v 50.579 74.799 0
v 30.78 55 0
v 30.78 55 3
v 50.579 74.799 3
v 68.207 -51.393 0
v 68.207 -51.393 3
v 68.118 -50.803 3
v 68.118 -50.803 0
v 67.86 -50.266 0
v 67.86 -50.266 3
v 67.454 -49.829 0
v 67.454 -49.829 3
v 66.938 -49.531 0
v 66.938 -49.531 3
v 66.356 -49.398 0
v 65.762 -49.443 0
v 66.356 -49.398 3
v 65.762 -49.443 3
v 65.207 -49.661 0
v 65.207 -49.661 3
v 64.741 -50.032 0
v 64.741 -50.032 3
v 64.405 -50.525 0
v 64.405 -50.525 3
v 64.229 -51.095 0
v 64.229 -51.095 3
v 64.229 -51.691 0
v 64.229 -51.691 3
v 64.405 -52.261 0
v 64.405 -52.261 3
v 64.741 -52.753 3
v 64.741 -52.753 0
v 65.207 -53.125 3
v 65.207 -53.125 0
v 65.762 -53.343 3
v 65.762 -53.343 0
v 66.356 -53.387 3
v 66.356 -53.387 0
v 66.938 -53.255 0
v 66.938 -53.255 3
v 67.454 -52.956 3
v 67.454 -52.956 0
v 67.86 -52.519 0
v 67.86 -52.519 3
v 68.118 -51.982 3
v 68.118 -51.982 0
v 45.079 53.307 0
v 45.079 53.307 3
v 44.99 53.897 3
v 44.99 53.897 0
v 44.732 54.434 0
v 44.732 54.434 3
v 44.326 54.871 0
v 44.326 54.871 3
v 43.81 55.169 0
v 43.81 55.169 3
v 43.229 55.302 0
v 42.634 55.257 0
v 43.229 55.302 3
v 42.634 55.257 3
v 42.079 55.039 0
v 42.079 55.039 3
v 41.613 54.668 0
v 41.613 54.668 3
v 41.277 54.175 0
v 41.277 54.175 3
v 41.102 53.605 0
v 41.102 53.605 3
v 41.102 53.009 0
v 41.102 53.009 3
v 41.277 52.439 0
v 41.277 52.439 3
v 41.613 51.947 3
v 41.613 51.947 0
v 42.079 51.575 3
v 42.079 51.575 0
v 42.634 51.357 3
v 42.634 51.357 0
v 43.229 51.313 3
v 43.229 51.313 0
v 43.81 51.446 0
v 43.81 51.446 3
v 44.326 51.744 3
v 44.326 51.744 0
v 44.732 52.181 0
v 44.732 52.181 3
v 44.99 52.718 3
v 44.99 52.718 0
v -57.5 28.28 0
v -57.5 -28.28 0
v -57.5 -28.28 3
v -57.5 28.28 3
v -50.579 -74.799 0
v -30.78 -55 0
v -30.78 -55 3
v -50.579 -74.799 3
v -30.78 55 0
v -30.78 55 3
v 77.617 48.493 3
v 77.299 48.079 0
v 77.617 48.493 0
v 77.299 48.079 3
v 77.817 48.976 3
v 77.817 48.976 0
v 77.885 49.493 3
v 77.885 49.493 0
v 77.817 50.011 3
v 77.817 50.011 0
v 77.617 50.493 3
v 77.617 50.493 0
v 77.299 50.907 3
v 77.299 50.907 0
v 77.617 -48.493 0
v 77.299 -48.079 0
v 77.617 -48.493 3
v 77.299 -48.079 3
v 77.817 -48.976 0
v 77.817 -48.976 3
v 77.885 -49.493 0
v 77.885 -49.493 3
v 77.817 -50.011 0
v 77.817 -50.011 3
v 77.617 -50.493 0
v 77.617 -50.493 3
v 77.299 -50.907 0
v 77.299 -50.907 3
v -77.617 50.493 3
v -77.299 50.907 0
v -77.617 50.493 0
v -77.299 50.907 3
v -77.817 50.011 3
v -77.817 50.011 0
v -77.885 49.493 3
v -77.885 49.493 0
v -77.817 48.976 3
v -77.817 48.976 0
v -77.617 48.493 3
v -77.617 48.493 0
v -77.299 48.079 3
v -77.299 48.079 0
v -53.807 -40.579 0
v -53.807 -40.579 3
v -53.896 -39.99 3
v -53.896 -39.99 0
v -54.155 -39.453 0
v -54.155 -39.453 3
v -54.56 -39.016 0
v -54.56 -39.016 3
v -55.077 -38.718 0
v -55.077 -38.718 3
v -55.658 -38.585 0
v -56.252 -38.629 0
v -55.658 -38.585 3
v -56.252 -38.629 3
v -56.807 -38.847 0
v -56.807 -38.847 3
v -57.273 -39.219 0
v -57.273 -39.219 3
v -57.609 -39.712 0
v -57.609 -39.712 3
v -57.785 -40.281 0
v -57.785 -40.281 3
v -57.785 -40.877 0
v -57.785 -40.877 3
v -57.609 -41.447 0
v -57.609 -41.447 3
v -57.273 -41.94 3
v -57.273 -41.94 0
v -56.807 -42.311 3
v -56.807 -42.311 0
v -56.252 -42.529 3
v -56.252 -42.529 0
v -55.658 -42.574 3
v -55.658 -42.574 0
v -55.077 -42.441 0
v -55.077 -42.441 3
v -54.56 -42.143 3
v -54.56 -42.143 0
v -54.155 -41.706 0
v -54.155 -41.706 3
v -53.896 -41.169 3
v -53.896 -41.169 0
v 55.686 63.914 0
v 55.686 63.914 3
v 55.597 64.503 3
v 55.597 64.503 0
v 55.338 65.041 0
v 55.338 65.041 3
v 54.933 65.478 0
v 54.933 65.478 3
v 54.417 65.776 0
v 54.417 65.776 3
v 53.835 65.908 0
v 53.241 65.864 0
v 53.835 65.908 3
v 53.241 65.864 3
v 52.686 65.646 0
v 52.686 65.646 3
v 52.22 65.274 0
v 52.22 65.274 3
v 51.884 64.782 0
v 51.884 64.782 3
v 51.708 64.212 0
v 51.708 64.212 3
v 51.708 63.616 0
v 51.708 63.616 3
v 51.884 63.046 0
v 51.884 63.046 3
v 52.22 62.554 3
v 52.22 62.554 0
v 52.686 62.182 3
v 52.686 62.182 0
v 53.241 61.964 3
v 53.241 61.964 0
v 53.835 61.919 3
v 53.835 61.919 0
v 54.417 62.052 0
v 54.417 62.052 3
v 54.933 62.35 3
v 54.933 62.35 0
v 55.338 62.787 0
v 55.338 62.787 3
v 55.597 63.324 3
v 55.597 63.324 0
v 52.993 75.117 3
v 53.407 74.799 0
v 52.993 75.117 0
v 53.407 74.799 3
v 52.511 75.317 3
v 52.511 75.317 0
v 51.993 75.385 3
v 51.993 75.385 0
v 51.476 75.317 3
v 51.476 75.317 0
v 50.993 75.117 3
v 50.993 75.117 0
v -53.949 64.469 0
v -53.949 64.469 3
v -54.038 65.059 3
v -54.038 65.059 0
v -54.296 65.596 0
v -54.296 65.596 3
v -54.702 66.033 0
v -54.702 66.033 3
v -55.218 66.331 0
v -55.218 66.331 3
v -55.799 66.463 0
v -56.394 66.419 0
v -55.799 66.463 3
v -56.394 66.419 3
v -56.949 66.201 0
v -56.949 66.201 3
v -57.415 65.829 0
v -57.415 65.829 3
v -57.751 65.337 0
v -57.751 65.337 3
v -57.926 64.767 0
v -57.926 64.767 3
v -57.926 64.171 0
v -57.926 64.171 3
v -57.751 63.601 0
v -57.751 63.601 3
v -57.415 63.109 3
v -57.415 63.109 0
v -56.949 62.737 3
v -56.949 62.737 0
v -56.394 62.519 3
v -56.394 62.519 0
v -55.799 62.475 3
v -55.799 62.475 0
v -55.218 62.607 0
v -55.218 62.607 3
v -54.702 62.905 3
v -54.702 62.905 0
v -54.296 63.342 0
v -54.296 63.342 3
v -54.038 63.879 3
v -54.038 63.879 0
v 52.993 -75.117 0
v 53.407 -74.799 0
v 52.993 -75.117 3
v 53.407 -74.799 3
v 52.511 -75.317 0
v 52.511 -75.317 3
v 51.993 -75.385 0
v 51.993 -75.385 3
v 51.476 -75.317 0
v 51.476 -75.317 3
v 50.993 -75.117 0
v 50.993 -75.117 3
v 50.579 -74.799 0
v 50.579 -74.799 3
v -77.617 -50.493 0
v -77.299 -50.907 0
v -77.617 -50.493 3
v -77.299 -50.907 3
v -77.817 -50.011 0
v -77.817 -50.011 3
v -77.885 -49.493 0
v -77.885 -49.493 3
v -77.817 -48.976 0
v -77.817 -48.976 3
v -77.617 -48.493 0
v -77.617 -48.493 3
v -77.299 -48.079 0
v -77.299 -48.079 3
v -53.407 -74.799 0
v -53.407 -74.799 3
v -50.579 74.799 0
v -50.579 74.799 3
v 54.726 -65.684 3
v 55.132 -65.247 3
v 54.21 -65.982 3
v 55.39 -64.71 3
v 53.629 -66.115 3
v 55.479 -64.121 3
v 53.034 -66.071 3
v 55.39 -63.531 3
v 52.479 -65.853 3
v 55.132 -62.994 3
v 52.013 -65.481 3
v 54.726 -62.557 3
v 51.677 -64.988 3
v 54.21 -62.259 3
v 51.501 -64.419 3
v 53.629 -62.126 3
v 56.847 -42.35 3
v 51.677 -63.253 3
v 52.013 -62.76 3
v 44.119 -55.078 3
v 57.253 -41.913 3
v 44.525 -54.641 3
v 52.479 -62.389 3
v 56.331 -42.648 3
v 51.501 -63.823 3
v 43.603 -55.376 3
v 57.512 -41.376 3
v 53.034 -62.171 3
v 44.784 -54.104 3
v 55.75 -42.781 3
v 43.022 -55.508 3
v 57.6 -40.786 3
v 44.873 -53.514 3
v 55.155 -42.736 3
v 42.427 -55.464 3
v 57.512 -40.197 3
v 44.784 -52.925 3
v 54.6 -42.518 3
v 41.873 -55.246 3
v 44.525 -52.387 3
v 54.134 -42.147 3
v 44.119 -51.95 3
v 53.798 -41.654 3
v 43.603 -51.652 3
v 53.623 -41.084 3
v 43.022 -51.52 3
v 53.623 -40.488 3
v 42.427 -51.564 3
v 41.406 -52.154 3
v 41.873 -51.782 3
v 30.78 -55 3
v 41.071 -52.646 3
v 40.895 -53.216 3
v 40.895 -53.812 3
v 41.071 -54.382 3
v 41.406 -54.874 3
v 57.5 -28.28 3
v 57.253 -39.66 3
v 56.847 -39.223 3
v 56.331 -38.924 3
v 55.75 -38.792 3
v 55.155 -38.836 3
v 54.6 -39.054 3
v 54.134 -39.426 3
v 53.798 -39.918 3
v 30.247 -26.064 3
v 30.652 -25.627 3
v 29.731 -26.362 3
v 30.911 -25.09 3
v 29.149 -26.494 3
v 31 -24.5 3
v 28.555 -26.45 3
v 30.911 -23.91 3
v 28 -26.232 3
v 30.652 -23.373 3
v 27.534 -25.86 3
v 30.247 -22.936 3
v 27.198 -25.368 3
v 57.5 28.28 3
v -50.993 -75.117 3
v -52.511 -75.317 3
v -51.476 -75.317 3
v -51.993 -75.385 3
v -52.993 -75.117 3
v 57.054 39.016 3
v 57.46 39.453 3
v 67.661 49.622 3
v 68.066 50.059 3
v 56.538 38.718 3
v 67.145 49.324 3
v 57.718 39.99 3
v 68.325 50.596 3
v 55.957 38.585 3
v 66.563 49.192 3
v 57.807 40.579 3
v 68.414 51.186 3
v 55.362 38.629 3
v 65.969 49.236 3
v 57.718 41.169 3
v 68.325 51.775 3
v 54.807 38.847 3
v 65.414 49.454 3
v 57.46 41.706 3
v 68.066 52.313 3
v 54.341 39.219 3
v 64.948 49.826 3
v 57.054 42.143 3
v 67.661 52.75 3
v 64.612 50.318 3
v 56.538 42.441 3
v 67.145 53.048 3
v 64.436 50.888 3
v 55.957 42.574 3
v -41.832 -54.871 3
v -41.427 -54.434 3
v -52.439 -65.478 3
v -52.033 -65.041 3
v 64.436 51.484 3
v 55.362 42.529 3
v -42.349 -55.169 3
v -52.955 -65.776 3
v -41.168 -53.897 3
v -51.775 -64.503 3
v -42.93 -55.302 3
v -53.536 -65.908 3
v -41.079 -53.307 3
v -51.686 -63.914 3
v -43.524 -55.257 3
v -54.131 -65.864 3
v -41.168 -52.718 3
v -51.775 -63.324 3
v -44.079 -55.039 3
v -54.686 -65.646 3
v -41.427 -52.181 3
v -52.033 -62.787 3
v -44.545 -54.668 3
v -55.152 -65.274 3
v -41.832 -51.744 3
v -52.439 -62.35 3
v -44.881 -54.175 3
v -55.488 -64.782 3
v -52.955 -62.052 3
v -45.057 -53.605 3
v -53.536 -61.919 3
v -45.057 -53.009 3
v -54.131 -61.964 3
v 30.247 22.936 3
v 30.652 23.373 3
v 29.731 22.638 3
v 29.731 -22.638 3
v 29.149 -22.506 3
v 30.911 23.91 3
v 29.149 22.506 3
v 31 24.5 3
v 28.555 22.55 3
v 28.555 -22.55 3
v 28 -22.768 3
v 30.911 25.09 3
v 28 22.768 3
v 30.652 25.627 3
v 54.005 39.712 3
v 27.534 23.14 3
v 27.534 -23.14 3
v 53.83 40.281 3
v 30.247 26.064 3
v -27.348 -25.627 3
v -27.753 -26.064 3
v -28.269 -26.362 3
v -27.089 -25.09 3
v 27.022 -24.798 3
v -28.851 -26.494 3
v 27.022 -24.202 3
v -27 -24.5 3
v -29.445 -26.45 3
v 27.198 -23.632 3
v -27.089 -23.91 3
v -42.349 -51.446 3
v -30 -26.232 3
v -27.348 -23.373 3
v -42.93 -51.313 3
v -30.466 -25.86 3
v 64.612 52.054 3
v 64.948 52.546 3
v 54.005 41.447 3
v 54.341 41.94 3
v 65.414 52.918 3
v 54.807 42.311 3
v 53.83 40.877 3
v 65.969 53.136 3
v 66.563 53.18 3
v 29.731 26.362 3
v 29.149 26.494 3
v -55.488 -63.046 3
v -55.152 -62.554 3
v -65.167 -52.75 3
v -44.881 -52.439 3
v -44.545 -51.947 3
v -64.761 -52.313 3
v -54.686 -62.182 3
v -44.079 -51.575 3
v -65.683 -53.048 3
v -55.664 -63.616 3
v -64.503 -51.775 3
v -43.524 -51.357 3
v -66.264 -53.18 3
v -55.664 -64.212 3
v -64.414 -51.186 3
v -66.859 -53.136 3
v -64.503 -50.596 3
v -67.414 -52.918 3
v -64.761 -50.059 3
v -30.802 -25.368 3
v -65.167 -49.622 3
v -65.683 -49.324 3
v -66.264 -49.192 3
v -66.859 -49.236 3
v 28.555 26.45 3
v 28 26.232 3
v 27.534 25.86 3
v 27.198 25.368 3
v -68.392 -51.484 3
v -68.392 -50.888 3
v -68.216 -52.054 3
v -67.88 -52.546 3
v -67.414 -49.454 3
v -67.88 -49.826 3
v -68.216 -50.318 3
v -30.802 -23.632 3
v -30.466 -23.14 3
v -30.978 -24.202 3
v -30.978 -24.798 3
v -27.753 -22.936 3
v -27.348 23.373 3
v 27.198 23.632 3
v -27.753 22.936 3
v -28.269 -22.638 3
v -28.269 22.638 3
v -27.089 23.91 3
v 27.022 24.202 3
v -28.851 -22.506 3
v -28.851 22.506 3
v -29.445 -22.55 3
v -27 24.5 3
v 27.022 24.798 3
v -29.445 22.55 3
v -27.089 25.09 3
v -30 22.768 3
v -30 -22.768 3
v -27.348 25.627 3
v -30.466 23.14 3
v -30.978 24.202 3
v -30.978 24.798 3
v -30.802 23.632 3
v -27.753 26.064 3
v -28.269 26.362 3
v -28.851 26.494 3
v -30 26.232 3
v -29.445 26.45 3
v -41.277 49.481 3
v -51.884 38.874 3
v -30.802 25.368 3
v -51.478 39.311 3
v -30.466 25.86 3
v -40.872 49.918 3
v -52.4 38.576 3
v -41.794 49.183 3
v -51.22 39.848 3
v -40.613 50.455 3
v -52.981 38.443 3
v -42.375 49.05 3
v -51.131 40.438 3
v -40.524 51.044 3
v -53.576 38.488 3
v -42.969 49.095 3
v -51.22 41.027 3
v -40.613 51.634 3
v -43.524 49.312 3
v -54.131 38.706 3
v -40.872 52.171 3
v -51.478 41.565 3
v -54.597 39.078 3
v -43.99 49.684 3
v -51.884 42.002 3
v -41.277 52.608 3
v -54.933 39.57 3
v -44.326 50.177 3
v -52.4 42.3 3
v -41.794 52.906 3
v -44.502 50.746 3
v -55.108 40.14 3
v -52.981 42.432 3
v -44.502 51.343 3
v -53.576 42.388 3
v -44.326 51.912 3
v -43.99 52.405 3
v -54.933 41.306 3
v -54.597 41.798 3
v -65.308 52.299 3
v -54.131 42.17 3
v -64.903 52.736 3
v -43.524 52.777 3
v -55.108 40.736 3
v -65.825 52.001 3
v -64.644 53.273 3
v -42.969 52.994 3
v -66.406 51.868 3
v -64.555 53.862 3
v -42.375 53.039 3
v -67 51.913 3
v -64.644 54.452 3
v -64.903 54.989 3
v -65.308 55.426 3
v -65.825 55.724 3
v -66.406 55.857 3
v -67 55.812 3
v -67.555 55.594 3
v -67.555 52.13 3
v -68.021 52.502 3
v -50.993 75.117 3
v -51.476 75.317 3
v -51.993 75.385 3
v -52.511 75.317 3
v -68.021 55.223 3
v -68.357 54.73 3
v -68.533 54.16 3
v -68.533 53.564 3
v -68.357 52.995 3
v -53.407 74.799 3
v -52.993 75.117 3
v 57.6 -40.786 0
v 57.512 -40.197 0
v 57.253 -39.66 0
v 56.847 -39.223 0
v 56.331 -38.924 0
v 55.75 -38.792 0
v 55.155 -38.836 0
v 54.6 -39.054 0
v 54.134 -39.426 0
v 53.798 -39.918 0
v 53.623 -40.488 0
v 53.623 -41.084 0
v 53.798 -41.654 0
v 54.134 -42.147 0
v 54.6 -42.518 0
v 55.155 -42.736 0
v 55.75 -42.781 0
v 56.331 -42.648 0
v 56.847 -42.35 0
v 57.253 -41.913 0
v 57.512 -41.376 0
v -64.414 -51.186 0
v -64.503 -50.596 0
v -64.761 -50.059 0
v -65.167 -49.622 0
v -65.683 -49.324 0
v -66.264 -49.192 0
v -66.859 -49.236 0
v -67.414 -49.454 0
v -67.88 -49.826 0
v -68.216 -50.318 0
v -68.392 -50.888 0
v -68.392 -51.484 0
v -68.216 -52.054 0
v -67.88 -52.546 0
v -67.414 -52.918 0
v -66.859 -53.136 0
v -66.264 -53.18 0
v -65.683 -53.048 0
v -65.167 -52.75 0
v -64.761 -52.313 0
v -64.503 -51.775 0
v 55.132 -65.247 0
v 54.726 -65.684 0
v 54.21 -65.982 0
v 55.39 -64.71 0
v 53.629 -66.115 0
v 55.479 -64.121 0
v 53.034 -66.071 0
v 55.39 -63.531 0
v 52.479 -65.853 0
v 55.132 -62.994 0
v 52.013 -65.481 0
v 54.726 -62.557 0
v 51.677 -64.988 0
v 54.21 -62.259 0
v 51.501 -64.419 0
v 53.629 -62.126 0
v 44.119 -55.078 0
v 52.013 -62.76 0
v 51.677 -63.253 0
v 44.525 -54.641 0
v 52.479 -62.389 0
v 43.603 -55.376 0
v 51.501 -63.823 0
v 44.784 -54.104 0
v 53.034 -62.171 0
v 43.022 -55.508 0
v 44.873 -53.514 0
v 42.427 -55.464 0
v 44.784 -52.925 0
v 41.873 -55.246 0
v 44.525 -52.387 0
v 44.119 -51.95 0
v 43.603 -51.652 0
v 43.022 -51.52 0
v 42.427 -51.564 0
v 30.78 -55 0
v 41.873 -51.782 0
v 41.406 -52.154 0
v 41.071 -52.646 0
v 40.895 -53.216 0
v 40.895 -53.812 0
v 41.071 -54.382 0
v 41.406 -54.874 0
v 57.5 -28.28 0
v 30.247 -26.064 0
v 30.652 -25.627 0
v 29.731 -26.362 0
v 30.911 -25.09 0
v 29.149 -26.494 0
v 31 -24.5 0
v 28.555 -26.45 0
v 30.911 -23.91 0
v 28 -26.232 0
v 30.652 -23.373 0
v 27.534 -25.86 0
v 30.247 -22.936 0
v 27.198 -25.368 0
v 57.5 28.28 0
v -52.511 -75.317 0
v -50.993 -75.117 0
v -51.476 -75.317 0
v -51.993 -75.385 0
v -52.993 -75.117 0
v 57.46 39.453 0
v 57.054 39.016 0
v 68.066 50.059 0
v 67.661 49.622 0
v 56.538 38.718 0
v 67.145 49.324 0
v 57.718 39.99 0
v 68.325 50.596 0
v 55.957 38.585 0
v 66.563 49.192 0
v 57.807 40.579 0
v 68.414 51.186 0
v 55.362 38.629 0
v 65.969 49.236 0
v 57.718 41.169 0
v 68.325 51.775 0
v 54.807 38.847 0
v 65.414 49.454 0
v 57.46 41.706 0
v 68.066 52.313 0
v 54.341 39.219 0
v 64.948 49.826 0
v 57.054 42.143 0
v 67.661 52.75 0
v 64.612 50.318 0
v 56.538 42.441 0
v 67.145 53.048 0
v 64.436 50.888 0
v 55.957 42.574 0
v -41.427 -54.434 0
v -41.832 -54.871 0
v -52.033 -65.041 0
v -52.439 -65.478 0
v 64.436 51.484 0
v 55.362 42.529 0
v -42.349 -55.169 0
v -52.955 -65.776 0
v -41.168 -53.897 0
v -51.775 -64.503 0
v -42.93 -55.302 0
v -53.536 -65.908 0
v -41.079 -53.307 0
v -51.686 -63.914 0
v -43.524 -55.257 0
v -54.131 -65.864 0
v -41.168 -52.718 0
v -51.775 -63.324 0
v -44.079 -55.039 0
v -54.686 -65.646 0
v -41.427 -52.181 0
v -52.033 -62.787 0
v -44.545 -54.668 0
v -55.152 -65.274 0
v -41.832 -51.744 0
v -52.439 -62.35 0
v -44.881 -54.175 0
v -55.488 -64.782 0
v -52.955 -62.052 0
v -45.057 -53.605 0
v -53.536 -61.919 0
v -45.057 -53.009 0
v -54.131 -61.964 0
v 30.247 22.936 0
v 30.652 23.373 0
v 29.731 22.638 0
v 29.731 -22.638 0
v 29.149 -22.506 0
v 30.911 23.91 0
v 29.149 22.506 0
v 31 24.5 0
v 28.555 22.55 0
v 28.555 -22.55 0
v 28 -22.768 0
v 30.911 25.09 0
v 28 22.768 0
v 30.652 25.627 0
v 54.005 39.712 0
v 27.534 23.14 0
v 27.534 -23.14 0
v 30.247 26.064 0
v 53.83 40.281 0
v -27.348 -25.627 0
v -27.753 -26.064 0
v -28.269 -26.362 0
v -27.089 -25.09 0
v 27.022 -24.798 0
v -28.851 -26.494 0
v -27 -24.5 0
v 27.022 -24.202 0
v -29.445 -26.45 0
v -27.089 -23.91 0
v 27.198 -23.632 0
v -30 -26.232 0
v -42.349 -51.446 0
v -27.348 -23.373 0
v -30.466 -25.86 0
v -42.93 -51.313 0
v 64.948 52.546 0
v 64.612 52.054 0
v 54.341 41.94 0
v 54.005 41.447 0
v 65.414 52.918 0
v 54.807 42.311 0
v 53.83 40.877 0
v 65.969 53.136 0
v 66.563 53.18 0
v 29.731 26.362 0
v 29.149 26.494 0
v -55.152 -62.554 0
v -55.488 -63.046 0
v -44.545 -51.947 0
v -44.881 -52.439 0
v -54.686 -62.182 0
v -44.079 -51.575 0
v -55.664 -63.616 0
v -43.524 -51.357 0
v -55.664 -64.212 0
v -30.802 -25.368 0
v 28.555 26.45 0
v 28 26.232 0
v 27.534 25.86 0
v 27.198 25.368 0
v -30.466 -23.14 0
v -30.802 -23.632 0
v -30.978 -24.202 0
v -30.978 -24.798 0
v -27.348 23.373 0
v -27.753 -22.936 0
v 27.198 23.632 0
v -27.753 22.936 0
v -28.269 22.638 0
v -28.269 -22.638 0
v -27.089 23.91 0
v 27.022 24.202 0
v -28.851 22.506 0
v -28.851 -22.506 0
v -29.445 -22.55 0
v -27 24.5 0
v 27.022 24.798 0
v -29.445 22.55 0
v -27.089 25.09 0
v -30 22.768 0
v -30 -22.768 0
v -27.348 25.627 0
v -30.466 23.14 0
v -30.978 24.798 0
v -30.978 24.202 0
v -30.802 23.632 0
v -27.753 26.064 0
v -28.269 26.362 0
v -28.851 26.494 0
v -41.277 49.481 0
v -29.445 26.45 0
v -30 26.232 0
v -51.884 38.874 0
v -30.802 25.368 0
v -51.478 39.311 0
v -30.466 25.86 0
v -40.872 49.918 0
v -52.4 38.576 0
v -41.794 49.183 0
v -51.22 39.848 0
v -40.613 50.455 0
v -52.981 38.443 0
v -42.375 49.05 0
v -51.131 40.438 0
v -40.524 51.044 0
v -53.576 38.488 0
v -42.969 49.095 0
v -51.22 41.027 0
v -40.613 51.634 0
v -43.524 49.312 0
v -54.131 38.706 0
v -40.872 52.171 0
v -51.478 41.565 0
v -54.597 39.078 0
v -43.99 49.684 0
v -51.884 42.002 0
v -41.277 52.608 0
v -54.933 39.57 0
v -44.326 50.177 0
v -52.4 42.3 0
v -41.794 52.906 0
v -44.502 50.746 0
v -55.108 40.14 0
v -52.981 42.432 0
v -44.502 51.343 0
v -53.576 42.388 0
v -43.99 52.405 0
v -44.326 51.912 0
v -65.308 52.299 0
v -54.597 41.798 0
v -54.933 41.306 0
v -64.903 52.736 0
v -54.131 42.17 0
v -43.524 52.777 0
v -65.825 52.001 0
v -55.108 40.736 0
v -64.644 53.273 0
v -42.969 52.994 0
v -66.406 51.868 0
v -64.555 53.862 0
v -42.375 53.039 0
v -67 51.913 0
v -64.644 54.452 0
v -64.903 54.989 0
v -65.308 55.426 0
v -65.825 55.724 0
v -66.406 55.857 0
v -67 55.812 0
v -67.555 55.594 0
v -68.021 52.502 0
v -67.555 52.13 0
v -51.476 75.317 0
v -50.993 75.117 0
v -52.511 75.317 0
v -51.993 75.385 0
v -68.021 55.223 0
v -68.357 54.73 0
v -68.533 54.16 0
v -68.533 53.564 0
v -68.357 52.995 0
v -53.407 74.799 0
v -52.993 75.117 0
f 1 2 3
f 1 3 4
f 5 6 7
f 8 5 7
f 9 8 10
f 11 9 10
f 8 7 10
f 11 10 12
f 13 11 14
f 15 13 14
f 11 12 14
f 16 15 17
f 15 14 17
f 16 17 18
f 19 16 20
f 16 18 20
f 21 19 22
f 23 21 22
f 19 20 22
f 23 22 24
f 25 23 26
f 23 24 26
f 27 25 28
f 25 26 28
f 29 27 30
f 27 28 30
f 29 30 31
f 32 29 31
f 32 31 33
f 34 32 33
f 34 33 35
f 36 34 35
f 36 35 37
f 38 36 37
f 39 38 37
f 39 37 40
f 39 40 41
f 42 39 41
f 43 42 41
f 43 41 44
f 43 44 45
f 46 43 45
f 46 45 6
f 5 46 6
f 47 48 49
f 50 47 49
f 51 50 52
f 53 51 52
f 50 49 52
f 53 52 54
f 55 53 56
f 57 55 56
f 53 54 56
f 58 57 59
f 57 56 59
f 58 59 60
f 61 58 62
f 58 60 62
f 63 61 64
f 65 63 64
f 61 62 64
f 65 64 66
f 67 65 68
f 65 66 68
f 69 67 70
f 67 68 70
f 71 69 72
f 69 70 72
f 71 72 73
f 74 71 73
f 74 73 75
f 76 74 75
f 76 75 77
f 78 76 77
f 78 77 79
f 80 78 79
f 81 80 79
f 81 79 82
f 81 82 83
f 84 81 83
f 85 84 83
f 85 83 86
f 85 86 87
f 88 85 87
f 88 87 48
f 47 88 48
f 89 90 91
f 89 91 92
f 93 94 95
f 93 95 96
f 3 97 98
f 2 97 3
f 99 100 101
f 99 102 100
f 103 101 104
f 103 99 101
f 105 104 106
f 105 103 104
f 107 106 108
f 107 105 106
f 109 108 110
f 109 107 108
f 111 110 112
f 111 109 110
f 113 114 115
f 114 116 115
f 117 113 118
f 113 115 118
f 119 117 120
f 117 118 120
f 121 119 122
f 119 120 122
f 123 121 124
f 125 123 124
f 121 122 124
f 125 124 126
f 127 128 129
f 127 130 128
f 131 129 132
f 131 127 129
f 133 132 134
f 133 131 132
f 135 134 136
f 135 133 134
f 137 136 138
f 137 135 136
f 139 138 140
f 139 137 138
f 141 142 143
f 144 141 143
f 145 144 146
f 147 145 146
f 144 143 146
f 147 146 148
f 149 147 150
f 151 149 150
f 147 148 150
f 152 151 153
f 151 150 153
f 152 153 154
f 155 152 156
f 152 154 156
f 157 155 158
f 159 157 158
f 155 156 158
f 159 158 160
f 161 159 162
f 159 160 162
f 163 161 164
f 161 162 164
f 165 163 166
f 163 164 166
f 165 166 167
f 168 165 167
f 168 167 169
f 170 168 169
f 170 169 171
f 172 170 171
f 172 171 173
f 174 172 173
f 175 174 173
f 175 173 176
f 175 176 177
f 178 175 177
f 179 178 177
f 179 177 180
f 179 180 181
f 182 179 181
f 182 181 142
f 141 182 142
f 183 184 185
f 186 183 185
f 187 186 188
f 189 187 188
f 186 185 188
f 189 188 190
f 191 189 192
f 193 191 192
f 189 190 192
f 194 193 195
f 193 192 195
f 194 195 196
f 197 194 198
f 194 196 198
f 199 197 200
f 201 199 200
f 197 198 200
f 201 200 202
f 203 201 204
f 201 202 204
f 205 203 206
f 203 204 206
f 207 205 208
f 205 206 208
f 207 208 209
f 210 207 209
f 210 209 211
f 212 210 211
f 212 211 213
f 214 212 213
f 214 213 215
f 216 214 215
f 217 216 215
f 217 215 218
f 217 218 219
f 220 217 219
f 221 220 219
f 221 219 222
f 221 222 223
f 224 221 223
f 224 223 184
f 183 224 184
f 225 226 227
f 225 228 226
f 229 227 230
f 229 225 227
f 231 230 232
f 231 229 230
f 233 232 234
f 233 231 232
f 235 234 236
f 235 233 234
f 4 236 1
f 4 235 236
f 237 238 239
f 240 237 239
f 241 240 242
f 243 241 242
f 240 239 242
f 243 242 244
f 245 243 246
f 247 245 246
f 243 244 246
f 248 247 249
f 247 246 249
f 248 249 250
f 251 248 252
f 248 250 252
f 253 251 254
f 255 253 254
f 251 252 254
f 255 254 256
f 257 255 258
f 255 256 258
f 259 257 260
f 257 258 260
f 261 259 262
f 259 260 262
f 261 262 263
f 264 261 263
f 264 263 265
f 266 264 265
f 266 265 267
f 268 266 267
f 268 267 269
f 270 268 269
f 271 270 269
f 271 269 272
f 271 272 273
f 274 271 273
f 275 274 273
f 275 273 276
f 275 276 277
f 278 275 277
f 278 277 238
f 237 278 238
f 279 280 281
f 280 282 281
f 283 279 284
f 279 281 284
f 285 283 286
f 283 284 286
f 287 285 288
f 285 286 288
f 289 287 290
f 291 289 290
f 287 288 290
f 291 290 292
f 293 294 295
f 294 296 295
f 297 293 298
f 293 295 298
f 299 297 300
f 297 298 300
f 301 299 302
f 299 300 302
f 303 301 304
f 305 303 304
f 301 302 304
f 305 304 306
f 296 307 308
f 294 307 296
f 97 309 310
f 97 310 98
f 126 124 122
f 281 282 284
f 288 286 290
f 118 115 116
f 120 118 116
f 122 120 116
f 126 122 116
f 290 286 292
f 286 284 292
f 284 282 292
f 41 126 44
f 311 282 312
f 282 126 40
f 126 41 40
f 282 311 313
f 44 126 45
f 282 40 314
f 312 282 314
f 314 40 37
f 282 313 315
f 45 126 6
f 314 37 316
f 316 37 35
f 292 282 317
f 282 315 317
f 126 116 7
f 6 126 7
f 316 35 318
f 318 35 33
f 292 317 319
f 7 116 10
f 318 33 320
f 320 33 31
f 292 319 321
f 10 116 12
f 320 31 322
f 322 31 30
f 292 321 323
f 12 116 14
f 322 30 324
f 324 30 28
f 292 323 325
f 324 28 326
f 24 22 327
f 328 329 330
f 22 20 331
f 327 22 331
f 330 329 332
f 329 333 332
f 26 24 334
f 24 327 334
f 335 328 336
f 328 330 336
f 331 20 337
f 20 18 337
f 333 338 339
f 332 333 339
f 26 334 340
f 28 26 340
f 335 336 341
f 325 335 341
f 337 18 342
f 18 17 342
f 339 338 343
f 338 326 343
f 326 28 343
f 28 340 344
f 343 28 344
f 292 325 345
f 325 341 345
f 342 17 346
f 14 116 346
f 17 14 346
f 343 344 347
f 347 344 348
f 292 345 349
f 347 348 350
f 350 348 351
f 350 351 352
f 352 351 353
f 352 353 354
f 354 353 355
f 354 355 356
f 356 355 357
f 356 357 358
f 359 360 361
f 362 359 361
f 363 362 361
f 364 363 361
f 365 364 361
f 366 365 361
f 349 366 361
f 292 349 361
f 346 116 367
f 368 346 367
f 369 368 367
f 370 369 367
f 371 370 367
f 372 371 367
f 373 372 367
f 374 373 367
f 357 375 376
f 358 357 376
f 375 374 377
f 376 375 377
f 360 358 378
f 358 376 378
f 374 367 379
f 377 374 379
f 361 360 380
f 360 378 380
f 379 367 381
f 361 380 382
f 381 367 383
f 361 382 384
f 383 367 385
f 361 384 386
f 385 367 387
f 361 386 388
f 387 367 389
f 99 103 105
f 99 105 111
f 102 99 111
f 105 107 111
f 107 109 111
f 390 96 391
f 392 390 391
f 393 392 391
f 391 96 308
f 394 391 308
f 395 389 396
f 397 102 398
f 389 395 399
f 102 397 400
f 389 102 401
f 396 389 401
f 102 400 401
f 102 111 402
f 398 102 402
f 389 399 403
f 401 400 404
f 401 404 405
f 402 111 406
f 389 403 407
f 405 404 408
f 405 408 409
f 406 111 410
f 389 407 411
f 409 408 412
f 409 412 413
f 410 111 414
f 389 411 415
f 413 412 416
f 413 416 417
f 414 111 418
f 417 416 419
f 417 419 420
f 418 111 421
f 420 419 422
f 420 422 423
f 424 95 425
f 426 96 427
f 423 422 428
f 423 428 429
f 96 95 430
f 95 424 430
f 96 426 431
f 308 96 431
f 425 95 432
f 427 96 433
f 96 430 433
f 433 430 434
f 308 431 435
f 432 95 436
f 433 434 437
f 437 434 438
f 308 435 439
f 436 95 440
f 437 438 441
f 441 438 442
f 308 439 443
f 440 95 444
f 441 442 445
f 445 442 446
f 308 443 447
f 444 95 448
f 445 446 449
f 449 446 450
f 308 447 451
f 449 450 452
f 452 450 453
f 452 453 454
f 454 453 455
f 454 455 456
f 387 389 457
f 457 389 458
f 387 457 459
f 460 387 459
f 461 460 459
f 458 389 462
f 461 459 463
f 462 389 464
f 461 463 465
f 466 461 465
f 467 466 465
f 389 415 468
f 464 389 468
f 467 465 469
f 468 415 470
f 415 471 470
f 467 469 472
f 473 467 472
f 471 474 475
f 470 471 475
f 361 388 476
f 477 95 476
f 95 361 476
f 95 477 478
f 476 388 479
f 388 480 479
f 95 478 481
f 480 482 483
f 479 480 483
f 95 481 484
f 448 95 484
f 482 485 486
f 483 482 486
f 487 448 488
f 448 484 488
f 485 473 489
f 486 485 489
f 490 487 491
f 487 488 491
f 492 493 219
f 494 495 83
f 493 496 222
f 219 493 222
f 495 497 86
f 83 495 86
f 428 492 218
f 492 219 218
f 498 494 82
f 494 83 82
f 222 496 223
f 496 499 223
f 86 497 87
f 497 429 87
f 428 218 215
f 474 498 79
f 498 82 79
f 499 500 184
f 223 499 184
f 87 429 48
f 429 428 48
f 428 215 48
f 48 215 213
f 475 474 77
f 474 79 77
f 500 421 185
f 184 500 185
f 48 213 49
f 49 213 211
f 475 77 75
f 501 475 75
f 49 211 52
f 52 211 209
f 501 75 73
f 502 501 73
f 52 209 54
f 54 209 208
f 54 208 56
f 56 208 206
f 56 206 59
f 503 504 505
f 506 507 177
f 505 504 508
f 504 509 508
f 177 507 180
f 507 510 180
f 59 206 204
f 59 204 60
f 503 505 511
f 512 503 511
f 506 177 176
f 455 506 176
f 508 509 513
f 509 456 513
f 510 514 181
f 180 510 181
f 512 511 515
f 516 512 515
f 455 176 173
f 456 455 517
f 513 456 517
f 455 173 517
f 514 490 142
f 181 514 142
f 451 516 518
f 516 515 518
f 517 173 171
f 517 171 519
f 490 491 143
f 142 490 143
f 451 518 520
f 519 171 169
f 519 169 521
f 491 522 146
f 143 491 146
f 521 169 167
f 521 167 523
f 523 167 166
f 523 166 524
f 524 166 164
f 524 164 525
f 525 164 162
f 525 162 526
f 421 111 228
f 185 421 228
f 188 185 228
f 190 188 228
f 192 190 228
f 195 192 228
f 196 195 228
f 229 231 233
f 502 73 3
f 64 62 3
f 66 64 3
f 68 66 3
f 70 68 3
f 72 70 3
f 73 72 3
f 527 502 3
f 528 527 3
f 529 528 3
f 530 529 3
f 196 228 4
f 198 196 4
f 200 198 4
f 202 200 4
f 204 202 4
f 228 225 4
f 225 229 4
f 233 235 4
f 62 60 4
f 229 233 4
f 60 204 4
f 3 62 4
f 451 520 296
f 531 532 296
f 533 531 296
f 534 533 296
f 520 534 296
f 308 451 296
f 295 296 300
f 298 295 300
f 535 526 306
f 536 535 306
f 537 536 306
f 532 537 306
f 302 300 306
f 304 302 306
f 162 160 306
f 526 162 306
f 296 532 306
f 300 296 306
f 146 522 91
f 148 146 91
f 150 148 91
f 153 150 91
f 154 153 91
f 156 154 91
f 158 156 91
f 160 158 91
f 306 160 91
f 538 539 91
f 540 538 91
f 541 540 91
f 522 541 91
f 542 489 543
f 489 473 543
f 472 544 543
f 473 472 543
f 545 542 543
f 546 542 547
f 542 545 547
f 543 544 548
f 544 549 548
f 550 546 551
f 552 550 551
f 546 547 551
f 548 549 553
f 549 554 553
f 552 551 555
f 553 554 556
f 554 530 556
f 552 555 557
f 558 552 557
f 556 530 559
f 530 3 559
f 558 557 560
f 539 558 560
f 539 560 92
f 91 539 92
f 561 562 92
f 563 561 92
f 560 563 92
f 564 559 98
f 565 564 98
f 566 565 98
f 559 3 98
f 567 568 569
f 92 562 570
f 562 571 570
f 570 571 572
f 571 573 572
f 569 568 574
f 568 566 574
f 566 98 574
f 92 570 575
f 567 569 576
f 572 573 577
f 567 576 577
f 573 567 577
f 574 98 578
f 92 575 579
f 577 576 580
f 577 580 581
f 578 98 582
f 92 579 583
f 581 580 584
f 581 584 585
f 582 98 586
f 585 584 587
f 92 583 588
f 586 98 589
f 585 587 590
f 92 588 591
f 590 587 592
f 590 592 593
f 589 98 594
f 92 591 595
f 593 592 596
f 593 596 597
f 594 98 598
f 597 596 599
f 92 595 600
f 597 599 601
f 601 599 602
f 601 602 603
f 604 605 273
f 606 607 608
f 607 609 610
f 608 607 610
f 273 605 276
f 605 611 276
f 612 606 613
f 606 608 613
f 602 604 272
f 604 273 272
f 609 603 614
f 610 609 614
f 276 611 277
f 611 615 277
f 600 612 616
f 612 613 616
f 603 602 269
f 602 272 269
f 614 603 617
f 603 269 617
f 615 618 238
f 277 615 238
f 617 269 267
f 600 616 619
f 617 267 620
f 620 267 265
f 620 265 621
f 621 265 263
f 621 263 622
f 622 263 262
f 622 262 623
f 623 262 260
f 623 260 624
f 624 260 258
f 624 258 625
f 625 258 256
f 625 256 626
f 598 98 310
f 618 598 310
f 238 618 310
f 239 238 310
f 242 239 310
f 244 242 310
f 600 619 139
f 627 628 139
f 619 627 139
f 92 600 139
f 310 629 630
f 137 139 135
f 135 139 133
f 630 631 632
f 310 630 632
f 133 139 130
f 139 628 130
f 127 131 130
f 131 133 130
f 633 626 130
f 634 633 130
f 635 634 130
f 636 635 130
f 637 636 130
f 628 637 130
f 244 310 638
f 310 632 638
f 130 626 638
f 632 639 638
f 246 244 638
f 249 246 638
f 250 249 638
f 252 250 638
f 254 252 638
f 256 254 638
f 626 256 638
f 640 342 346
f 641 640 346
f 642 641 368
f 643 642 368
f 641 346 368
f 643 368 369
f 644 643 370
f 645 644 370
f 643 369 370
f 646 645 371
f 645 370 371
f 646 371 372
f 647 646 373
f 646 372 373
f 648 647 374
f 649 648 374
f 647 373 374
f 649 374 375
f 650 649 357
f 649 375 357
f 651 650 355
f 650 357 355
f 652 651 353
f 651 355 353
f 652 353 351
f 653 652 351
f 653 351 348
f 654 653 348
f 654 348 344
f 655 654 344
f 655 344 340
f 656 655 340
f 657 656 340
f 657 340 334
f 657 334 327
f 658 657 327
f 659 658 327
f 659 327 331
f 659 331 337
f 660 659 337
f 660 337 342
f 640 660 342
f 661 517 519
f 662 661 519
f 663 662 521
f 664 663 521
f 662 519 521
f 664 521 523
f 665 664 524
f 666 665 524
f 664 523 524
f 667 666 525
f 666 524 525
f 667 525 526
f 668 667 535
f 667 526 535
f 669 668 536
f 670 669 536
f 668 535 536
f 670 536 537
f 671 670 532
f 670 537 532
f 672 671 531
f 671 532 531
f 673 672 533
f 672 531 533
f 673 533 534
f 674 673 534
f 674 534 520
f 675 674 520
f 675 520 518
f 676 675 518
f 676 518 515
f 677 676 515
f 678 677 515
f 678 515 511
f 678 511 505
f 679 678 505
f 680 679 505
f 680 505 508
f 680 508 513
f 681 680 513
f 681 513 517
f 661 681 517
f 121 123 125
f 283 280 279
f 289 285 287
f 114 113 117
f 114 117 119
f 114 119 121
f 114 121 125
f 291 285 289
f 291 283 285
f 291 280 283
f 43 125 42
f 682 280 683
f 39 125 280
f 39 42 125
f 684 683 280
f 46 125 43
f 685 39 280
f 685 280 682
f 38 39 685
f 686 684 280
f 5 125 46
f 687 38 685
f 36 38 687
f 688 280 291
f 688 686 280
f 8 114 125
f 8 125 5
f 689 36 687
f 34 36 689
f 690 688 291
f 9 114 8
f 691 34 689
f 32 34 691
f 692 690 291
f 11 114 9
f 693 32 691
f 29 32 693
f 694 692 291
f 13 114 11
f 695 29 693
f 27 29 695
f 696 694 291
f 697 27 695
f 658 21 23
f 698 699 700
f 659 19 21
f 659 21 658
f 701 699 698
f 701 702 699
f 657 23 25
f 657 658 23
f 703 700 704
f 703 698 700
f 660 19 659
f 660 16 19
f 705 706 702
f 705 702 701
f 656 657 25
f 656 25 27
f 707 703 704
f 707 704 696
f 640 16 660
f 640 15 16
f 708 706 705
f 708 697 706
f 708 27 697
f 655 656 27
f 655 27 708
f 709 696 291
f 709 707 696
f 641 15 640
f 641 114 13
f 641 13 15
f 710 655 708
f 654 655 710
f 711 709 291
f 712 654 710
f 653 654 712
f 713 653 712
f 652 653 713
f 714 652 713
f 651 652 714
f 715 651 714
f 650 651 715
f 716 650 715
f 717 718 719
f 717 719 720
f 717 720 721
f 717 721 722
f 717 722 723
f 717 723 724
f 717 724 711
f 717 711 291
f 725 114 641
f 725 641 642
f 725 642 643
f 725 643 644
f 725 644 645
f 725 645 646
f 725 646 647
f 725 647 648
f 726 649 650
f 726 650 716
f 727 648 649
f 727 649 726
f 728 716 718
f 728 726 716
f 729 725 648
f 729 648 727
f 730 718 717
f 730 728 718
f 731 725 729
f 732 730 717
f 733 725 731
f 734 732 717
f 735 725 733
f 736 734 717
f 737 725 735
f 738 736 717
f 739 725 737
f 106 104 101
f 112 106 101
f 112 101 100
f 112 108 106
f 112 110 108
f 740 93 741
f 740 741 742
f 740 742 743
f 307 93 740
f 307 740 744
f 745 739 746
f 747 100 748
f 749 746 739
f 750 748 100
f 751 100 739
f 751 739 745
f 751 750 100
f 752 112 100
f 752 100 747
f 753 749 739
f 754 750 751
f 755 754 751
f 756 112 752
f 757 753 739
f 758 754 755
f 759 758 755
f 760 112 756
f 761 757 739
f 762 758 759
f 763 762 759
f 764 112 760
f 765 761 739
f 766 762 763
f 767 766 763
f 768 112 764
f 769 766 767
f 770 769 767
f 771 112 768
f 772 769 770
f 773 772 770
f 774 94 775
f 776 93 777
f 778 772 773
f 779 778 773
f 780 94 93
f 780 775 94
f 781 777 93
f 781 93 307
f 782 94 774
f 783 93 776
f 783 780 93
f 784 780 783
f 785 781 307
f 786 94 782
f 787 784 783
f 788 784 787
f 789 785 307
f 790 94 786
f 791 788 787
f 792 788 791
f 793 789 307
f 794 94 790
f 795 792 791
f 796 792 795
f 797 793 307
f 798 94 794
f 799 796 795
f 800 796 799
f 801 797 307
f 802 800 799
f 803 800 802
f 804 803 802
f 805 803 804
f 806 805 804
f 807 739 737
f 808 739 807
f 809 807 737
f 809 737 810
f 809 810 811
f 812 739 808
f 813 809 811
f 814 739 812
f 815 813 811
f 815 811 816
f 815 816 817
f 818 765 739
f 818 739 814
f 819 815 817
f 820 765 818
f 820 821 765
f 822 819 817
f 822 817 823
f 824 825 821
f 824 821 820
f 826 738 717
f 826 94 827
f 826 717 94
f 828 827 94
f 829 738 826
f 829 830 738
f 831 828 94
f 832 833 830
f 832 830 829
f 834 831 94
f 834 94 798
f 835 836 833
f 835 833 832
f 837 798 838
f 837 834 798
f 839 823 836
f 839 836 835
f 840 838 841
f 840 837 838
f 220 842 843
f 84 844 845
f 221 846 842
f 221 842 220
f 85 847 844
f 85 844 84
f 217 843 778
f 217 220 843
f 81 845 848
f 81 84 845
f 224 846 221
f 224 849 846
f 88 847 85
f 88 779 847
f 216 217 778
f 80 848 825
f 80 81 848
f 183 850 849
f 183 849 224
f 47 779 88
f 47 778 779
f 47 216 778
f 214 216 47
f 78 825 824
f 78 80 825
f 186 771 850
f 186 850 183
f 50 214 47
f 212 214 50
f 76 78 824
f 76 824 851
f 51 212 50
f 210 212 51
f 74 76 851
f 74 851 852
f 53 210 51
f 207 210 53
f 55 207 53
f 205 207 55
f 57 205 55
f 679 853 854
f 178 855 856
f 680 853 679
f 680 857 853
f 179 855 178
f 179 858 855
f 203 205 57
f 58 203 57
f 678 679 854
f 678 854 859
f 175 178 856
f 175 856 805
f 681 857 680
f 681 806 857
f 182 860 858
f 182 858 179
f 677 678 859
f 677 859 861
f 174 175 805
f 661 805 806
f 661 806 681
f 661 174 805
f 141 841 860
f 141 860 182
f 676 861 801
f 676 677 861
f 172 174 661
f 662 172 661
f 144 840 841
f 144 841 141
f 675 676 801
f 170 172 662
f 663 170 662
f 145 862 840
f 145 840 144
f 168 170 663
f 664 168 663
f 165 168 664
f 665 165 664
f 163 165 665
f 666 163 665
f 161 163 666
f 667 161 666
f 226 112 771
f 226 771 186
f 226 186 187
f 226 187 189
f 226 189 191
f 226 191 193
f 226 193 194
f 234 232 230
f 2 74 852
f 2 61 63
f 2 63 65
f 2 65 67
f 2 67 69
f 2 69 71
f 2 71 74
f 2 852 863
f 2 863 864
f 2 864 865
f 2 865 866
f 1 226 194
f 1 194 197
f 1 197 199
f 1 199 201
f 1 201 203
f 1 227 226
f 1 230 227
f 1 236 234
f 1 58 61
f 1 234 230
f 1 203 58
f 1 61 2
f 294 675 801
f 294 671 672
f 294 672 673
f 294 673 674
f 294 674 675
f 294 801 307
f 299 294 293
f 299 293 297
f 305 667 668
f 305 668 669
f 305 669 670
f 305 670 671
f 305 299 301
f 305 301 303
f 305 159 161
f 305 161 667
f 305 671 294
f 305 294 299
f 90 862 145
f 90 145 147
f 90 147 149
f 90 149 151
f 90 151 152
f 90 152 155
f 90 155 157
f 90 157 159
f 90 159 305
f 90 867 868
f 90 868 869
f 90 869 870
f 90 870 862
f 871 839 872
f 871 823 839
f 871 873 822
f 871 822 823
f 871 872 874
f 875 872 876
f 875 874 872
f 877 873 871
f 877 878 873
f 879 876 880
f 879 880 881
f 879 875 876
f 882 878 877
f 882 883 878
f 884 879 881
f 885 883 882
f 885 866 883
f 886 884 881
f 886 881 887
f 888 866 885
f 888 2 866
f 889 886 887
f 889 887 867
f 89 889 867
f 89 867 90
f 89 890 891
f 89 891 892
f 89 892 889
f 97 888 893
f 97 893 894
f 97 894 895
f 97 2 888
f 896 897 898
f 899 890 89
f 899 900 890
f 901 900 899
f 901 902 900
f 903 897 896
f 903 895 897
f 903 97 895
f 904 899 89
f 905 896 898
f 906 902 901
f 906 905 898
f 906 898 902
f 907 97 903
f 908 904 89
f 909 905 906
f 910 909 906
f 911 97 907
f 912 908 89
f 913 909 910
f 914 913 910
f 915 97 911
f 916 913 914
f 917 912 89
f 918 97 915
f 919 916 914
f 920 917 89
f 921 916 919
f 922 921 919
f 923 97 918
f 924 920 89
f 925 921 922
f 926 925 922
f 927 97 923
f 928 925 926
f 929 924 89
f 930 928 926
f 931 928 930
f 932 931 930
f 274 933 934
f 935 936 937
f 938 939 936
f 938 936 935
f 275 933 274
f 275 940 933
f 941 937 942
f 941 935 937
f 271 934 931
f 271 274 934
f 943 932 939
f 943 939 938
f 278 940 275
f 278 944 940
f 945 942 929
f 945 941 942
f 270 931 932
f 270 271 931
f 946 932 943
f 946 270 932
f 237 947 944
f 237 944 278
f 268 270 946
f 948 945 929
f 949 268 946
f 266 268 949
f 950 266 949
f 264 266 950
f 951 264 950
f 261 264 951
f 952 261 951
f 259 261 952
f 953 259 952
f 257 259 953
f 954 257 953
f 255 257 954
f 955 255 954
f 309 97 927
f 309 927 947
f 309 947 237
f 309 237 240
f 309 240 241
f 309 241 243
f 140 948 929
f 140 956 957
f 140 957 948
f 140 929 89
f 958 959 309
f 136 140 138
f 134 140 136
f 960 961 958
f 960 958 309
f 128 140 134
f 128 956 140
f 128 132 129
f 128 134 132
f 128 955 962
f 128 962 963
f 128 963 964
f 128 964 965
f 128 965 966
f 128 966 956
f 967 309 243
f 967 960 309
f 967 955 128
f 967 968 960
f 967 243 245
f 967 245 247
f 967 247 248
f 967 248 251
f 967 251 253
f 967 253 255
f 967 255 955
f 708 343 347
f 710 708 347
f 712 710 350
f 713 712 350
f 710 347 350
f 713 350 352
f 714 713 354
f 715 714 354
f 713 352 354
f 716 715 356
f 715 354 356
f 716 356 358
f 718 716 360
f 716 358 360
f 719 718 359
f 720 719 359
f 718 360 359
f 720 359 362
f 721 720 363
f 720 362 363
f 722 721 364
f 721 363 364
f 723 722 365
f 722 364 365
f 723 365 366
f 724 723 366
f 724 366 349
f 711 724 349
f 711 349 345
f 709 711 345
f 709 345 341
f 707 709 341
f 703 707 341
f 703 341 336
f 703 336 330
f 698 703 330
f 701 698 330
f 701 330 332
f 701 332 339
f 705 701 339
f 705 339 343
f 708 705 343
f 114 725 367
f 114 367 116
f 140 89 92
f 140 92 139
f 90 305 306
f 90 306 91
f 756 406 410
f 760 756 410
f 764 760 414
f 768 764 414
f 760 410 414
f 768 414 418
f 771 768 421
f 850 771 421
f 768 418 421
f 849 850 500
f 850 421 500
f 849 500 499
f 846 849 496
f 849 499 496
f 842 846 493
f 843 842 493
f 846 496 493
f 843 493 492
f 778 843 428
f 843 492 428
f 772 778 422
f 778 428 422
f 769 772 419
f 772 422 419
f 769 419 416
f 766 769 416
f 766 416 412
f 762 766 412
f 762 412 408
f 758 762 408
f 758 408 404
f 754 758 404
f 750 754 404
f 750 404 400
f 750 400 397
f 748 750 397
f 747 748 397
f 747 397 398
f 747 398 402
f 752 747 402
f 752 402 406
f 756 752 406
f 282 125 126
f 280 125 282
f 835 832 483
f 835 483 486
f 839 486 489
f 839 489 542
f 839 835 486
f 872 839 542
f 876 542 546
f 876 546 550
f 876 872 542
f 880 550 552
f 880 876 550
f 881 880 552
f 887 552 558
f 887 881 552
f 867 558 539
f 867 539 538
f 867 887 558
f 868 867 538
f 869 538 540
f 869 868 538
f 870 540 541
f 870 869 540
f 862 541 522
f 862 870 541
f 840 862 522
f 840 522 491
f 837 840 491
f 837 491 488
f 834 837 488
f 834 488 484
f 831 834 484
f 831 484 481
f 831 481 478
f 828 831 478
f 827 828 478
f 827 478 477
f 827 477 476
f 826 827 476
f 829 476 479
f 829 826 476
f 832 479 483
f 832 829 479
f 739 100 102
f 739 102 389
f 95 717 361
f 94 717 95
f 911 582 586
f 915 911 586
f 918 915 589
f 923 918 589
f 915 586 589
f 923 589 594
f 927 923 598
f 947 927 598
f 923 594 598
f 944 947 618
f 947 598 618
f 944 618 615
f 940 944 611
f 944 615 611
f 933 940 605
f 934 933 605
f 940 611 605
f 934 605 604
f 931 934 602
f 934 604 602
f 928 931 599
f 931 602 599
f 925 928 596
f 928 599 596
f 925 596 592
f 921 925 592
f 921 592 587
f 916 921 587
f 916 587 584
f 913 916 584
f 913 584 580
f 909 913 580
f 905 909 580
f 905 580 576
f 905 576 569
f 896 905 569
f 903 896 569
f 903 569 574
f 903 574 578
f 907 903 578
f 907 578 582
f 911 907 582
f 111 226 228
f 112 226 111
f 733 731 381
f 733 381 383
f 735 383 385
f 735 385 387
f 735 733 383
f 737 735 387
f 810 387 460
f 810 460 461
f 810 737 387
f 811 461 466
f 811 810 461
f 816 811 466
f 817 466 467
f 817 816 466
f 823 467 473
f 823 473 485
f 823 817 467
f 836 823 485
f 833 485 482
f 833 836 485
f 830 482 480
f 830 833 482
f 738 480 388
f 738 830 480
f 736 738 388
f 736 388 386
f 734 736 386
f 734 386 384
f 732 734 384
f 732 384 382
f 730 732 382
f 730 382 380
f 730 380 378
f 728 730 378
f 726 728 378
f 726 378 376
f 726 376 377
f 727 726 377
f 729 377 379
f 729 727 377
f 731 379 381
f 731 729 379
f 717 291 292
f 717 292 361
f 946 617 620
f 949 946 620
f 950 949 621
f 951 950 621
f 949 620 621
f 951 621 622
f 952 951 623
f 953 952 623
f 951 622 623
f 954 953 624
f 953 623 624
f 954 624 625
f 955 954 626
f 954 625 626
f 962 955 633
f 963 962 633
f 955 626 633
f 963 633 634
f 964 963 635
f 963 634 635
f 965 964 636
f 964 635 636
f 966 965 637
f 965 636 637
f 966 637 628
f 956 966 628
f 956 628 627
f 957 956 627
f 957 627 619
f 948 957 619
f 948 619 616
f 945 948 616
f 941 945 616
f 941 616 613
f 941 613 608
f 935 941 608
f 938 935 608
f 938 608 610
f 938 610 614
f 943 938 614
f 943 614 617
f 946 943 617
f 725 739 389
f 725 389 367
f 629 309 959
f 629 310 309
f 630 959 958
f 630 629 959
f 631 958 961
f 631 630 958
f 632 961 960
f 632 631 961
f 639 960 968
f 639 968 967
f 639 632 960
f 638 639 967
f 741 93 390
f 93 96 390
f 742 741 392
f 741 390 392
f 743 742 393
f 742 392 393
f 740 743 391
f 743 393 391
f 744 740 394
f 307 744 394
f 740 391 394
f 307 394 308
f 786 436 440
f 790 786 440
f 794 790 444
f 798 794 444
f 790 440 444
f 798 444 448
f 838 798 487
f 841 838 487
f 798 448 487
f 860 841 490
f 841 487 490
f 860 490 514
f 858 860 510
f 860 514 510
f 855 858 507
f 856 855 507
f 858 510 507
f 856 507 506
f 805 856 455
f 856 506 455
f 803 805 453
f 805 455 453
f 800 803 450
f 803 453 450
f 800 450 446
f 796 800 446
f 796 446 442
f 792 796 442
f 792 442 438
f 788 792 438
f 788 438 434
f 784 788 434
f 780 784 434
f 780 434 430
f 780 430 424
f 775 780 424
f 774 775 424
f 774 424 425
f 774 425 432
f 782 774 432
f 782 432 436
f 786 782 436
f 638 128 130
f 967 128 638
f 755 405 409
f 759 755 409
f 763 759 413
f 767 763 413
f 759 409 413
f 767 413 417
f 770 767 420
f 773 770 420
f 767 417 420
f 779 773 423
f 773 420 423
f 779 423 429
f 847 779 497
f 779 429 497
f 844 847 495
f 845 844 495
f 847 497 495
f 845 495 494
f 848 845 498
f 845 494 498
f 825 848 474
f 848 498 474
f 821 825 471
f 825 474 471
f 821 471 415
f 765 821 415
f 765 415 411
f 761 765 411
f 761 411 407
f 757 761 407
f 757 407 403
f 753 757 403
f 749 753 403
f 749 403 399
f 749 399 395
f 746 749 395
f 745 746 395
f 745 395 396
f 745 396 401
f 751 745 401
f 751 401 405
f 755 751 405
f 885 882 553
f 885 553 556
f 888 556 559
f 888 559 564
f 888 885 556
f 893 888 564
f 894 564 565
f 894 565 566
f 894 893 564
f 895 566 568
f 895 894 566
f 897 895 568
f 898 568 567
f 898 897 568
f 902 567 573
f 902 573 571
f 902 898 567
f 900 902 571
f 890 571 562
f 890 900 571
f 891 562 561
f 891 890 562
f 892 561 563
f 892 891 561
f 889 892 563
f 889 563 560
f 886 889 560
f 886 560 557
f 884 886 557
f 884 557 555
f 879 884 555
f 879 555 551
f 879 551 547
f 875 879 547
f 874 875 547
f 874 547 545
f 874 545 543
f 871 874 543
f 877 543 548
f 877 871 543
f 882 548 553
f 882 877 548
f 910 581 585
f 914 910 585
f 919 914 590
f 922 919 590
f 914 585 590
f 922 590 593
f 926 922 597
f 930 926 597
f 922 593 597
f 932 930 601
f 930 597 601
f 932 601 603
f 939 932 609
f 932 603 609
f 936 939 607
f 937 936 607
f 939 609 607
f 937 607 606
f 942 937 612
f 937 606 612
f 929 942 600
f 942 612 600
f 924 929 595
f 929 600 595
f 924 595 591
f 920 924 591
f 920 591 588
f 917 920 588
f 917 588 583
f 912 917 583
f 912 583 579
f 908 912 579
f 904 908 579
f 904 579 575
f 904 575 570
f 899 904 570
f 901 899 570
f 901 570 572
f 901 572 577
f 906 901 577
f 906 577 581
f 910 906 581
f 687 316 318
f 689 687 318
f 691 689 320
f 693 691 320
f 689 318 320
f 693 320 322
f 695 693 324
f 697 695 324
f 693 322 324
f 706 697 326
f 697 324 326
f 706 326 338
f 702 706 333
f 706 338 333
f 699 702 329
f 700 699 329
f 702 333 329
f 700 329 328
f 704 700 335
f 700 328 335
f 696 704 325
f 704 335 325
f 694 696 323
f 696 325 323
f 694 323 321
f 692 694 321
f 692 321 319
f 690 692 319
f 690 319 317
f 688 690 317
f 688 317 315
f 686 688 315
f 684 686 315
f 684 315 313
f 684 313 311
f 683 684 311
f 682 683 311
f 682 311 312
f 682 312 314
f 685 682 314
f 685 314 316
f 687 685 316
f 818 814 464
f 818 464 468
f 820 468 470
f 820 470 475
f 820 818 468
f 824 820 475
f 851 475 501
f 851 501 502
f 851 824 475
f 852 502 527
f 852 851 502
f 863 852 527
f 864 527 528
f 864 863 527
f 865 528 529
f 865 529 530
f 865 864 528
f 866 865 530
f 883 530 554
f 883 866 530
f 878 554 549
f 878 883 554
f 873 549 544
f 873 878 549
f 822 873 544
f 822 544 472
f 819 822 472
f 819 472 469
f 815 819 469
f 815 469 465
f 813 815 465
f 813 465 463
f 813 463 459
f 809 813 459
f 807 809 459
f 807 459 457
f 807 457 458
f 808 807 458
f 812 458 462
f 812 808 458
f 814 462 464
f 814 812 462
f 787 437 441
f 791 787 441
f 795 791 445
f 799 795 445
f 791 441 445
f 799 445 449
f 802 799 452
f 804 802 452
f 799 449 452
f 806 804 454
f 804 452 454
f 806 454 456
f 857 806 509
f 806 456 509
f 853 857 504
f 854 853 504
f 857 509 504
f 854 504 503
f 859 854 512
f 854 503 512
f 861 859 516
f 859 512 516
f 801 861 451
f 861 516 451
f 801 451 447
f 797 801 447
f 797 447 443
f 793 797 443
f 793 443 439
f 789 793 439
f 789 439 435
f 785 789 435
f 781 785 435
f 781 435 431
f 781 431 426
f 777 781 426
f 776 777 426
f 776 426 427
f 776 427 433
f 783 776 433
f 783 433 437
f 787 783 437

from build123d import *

# Parameters (mm, degrees)
SKETCH1_R           = 2
BOSS_EXTRUDE1_DEPTH = 3
SKETCH2_R           = 2
CUT_EXTRUDE1_DEPTH  = 110.604839186
FILLET1_R           = 2


with BuildPart() as part:
    # Sketch1 → Boss-Extrude1 (new body)
    with BuildSketch(Plane.XY):
        Polygon((78.713203436, 49.493203436), (57.5, 28.28), (57.5, -28.28), (78.713203436, -49.493203436), (51.993203436, -76.213203436), (30.78, -55), (-30.78, -55), (-51.993203436, -76.213203436), (-78.713203436, -49.493203436), (-57.5, -28.28), (-57.5, 28.28), (-78.713203436, 49.493203436), (-51.993203436, 76.213203436), (-30.78, 55), (30.78, 55), (51.993203436, 76.213203436), align=None)
        with Locations((29, -24.5)):
            Circle(SKETCH1_R, mode=Mode.SUBTRACT)
        with Locations((29, 24.5)):
            Circle(SKETCH1_R, mode=Mode.SUBTRACT)
        with Locations((-29, -24.5)):
            Circle(SKETCH1_R, mode=Mode.SUBTRACT)
        with Locations((-29, 24.5)):
            Circle(SKETCH1_R, mode=Mode.SUBTRACT)
    extrude(amount=BOSS_EXTRUDE1_DEPTH)

    # Sketch2 → Cut-Extrude1 (cut, through all)
    with BuildSketch(Plane.XY.offset(3)):
        with Locations((43.079339828, 53.30726189)):
            Circle(SKETCH2_R)
        with Locations((53.685941546, 63.913863607)):
            Circle(SKETCH2_R)
        with Locations((55.80726189, 40.579339828)):
            Circle(SKETCH2_R)
        with Locations((66.413863607, 51.185941546)):
            Circle(SKETCH2_R)
        with Locations((-66.413863607, -51.185941546)):
            Circle(SKETCH2_R)
        with Locations((-55.80726189, -40.579339828)):
            Circle(SKETCH2_R)
        with Locations((-43.079339828, -53.30726189)):
            Circle(SKETCH2_R)
        with Locations((-53.685941546, -63.913863607)):
            Circle(SKETCH2_R)
        with Locations((-55.948736265, 64.468991324)):
            Circle(SKETCH2_R)
        with Locations((-42.524212111, 51.044467171)):
            Circle(SKETCH2_R)
        with Locations((-53.130813829, 40.437865453)):
            Circle(SKETCH2_R)
        with Locations((-66.555337983, 53.862389606)):
            Circle(SKETCH2_R)
        with Locations((55.600435219, -40.786166499)):
            Circle(SKETCH2_R)
        with Locations((42.872513157, -53.51408856)):
            Circle(SKETCH2_R)
        with Locations((66.207036937, -51.392768217)):
            Circle(SKETCH2_R)
        with Locations((53.479114875, -64.120690278)):
            Circle(SKETCH2_R)
    extrude(amount=-CUT_EXTRUDE1_DEPTH, mode=Mode.SUBTRACT)

    # Fillet1
    fillet1_edges = [part.edges().sort_by_distance(p)[0] for p in [
        (78.713203436, -49.493203436, 1.5),
        (51.993203436, -76.213203436, 1.5),
        (-51.993203436, -76.213203436, 1.5),
        (-78.713203436, -49.493203436, 1.5),
        (-78.713203436, 49.493203436, 1.5),
        (-51.993203436, 76.213203436, 1.5),
        (51.993203436, 76.213203436, 1.5),
        (78.713203436, 49.493203436, 1.5),
    ]]
    fillet(fillet1_edges, radius=FILLET1_R)


solid = part.part
